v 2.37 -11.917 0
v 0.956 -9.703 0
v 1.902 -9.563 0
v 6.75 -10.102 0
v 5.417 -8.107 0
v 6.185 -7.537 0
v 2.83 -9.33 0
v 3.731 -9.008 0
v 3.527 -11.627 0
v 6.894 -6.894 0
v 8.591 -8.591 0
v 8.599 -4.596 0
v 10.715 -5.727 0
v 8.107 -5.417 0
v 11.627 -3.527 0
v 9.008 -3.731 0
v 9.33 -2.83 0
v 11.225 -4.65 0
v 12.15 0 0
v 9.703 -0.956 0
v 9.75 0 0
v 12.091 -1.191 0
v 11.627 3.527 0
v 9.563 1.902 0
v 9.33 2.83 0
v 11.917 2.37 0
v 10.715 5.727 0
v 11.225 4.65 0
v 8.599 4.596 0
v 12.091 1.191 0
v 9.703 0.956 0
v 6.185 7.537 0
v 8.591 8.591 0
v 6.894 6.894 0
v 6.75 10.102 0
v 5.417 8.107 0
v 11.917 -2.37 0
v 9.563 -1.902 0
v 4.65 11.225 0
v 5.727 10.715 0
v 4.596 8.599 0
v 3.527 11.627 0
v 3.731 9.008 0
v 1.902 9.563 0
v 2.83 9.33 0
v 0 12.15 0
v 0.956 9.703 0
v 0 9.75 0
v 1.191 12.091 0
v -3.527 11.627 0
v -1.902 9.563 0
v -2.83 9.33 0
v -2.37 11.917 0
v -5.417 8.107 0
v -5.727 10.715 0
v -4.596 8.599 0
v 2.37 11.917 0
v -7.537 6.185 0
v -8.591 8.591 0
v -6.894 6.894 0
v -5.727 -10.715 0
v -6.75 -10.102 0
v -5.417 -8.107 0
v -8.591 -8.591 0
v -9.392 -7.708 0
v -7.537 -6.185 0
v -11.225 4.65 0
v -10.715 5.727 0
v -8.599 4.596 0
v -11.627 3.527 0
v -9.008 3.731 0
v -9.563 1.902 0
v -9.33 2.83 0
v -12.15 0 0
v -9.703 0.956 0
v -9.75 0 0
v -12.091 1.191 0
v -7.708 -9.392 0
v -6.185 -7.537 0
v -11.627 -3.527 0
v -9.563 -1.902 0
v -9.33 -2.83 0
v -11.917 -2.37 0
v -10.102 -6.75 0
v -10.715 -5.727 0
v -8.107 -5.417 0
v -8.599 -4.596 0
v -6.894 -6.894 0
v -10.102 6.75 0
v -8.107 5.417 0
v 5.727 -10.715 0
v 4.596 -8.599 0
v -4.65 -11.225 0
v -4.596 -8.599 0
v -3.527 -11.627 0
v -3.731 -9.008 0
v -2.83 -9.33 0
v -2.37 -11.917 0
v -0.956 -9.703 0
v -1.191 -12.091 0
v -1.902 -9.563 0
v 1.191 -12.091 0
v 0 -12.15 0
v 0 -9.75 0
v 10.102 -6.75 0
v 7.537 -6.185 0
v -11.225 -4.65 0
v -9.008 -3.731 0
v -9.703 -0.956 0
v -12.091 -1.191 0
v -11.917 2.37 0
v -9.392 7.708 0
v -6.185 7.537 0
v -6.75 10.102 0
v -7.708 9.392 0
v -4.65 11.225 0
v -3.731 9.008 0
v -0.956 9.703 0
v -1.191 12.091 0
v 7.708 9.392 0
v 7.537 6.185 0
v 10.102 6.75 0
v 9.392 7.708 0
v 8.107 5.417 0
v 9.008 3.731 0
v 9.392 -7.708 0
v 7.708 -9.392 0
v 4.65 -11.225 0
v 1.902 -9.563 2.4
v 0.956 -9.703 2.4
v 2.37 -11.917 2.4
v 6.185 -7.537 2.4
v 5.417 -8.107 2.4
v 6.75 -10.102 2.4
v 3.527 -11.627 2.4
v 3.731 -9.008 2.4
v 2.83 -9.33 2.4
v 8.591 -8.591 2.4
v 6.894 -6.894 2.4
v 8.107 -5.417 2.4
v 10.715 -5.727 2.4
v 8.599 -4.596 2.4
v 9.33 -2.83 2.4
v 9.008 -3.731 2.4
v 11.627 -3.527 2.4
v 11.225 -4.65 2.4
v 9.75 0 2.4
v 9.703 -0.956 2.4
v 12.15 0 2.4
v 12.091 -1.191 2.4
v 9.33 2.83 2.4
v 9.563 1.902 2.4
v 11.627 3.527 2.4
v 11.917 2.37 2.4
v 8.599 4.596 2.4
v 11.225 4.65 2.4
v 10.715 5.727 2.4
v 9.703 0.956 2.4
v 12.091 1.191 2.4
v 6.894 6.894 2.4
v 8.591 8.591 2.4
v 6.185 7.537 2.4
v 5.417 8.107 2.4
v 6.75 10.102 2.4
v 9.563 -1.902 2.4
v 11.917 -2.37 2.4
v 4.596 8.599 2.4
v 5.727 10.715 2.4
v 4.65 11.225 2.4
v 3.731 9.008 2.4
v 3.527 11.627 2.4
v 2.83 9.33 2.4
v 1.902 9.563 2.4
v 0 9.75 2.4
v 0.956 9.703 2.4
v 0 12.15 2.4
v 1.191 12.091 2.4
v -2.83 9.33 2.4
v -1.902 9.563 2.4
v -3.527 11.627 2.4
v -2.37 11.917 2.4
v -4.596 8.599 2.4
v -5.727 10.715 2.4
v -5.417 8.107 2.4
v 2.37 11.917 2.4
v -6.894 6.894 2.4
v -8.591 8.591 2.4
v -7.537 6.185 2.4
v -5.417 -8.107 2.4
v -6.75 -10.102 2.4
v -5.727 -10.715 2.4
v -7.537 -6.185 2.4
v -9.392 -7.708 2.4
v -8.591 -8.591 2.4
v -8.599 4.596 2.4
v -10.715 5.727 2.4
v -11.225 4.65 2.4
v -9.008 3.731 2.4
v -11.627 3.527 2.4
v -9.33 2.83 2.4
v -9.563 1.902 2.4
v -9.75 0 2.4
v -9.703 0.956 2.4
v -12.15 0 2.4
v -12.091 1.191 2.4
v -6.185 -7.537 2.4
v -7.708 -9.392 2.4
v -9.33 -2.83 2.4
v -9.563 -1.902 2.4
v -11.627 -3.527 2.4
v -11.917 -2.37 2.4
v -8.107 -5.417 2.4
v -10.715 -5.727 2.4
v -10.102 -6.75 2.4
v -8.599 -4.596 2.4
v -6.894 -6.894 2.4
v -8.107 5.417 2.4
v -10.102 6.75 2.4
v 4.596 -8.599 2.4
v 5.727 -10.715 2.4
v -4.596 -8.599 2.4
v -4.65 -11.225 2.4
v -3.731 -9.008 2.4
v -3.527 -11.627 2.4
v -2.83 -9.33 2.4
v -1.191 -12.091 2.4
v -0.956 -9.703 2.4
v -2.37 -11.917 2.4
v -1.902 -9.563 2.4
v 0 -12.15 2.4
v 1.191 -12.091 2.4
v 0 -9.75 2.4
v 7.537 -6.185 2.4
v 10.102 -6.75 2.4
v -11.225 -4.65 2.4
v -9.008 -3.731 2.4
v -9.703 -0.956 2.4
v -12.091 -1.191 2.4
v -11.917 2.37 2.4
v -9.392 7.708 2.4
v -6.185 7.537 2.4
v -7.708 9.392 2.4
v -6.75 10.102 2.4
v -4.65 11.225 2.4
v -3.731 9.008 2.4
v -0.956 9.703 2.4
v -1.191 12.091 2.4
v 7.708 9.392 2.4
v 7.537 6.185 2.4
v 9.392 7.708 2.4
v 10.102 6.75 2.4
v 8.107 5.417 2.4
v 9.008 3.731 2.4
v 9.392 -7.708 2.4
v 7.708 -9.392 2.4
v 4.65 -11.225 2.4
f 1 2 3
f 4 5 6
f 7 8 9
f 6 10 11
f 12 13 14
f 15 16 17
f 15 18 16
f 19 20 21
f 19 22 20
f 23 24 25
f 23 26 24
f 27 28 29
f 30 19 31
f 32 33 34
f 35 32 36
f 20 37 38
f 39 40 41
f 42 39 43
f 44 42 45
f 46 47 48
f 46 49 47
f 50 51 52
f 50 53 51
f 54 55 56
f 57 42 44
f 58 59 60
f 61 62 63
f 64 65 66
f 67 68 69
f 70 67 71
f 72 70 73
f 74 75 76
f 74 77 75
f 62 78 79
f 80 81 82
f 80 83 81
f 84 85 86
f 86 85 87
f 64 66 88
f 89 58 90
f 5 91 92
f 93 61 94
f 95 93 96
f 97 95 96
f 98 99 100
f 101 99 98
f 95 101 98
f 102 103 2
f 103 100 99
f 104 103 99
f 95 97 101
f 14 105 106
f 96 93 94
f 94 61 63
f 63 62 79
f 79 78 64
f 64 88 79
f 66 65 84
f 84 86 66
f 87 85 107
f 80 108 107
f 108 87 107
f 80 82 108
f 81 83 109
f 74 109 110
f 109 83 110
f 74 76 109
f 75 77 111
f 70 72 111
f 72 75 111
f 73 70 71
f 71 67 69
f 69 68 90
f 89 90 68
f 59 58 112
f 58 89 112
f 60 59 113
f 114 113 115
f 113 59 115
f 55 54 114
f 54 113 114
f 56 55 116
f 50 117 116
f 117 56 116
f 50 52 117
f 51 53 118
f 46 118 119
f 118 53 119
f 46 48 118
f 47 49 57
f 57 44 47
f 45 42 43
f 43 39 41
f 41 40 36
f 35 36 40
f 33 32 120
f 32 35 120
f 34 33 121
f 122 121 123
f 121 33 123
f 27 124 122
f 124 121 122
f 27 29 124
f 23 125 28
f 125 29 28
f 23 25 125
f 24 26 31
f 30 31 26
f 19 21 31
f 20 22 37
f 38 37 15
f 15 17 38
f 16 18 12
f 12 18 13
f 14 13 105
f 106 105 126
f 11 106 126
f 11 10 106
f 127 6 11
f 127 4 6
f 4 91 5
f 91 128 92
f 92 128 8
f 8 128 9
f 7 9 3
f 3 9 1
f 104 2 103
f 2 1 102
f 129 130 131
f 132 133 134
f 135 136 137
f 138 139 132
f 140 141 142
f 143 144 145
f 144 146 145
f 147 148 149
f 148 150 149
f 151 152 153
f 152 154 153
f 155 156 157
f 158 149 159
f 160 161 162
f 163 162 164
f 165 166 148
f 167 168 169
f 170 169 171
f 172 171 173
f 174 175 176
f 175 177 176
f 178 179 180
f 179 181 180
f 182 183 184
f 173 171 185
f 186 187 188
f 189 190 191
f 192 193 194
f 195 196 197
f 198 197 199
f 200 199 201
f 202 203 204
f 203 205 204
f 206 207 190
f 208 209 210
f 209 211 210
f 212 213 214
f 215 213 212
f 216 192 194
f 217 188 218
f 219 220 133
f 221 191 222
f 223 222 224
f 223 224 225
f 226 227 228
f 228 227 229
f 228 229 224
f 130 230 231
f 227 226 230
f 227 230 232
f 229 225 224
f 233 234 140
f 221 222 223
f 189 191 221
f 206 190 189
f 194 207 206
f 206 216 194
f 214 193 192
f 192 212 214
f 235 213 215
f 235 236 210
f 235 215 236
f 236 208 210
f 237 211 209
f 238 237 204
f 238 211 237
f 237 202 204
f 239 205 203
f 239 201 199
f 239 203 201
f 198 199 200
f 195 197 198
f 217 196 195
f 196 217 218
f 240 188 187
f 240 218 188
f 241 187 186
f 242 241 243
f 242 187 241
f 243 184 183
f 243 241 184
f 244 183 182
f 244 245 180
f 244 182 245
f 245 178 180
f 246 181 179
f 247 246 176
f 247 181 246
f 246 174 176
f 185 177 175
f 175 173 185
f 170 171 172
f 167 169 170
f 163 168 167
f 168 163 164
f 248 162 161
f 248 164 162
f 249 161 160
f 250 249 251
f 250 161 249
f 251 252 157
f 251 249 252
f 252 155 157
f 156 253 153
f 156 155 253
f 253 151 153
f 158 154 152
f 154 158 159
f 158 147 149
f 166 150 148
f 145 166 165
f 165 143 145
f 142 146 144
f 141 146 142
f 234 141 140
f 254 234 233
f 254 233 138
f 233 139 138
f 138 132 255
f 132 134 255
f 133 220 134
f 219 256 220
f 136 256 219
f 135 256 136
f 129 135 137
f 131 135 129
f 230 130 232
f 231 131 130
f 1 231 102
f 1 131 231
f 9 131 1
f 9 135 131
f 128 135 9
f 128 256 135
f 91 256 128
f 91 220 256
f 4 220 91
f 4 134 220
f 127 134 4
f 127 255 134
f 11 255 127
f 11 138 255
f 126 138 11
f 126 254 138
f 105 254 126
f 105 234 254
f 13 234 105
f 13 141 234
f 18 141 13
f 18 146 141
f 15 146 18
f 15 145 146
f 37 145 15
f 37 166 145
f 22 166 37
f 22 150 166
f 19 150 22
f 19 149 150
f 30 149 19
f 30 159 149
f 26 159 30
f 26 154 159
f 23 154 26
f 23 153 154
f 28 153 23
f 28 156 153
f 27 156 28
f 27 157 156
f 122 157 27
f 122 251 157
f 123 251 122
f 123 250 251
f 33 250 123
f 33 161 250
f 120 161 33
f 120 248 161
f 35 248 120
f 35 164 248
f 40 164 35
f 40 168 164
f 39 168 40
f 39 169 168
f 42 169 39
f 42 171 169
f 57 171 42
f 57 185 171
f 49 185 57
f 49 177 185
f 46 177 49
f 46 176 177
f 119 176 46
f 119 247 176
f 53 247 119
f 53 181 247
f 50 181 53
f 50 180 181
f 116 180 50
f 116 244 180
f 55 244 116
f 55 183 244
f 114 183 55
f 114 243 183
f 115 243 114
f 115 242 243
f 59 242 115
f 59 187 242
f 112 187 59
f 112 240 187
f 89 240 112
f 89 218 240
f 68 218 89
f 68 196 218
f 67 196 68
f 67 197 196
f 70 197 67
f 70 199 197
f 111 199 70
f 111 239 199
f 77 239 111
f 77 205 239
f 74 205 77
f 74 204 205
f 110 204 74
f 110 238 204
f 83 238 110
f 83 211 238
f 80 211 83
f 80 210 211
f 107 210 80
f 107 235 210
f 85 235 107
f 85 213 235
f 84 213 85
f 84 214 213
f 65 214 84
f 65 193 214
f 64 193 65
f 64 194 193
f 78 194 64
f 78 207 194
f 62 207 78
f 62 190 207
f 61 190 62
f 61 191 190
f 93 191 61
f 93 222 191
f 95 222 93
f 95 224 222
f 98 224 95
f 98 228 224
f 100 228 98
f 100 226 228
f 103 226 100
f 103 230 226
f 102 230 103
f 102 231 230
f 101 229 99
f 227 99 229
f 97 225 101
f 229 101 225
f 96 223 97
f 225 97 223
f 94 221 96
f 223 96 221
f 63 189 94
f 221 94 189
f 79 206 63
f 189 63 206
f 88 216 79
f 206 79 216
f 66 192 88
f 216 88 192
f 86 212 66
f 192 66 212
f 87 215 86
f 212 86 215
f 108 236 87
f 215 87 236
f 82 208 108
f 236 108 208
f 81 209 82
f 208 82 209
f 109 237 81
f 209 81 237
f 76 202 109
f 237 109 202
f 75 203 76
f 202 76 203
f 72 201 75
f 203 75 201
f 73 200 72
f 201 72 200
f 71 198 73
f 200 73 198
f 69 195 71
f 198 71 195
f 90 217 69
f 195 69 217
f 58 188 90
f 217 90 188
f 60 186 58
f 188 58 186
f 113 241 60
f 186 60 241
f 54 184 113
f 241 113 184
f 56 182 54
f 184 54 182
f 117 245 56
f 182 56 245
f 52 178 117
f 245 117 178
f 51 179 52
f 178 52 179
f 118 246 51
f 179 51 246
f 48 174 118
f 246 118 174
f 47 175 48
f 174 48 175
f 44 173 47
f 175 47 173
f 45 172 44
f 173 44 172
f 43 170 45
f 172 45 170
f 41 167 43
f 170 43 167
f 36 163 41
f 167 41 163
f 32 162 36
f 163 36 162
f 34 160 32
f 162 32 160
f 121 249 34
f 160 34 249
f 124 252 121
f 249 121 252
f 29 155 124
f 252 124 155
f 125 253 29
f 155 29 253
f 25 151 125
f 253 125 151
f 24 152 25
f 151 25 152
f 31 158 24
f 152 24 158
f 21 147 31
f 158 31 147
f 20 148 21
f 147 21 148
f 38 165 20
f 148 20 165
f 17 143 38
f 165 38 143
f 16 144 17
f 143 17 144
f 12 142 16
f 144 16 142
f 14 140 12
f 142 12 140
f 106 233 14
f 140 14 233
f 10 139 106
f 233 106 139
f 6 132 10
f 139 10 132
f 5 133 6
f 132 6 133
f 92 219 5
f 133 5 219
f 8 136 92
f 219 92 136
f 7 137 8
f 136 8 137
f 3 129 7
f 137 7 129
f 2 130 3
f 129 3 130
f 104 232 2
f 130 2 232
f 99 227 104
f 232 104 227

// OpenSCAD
// Ring

$fn = 64;

finger_dia = 19.5;
ring_thick = 2.4;

linear_extrude(ring_thick)
difference() {
    circle(d=ring_thick*2+finger_dia);
    circle(d=finger_dia);
}
